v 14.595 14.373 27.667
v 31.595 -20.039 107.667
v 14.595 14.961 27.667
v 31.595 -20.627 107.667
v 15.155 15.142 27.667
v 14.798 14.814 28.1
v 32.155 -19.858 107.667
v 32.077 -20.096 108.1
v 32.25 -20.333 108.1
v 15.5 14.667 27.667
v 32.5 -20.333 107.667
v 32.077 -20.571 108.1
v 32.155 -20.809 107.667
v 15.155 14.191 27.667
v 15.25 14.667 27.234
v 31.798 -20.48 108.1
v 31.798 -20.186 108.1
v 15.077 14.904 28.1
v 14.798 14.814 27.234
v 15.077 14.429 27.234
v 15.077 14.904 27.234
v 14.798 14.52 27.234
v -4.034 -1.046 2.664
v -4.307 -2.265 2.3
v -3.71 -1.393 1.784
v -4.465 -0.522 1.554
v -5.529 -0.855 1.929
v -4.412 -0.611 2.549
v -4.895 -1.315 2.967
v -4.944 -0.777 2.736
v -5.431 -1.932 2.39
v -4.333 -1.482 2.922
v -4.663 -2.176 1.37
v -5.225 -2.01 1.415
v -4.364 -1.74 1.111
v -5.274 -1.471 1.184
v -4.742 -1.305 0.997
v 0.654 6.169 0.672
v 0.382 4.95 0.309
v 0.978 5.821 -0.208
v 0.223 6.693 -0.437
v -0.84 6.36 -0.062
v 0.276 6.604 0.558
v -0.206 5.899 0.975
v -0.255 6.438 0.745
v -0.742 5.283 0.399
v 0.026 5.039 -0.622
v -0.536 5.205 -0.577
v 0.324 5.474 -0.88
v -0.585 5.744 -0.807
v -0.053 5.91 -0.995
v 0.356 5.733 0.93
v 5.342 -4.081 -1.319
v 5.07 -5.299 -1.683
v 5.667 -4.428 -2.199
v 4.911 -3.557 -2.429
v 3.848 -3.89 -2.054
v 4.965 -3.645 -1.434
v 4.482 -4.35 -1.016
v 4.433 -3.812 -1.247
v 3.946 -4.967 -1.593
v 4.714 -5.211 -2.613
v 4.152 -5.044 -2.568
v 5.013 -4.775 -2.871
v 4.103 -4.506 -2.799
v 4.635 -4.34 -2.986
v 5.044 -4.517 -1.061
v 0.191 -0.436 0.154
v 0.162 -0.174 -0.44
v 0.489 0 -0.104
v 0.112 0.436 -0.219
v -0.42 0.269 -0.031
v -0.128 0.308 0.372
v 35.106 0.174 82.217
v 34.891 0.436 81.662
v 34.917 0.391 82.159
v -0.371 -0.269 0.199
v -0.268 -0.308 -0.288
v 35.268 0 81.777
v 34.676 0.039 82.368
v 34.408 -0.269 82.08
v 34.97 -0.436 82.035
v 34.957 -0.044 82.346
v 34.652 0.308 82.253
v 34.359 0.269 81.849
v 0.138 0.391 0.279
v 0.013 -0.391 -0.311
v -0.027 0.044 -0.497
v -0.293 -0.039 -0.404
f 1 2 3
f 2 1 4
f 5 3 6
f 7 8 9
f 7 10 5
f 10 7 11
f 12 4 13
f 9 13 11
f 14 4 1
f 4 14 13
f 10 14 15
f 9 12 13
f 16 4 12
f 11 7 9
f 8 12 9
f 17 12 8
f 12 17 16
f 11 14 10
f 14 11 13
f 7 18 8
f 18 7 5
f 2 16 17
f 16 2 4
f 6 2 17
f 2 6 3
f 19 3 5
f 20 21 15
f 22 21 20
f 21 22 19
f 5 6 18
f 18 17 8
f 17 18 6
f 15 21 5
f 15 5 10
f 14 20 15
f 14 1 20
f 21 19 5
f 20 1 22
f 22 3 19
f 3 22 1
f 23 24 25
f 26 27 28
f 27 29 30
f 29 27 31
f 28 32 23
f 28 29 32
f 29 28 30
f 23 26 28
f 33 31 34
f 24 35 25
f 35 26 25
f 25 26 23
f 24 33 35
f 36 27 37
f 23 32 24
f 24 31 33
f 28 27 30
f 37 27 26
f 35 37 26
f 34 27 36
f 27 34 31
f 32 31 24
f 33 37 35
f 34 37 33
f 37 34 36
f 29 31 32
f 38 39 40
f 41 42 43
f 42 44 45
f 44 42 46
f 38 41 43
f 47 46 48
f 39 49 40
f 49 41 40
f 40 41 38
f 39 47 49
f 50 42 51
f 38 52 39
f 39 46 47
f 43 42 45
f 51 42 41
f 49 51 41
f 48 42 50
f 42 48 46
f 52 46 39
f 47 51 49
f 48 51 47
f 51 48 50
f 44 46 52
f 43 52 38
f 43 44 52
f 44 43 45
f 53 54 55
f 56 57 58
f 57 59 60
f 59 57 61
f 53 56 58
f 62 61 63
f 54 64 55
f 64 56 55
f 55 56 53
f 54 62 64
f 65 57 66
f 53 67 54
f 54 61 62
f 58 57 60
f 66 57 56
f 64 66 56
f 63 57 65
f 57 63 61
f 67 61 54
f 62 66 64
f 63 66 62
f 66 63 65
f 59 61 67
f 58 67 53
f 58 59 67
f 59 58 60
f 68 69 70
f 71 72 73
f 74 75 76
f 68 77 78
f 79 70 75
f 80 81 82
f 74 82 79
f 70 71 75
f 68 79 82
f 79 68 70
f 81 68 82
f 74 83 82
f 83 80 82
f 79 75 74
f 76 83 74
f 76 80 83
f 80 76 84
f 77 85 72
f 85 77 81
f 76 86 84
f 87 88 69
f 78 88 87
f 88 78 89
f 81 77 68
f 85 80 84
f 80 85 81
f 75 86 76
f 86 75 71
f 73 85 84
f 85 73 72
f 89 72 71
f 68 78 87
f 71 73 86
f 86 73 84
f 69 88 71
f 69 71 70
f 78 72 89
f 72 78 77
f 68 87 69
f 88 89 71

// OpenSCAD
/*[show]*/
showOrig=true;
showModified=true;


//translate a random polygon to origin and lay flat

verts= [[10,13,28],[15,20,30],[20,11,25]];

//calculate normal
v= cross(verts[2]-verts[0],verts[1]-verts[0]);

//calculate centroid
centroid=verts[0]/3+verts[1]/3+verts[2]/3;

//calculate rotation from normal
rotX=atan2(v.y,v.z);
rotY=atan2(v.x,v.z);
rotZ=atan2(v.y,v.x); //(not needed)

rot=[rotX,rotY,0];

if (showOrig){
  //normal vector
  color("green") translate(centroid) hull(){
      sphere(0.5);
      translate(v) sphere(0.5);
    }
  polyhedron(verts,[[0,1,2]]);
  } 

if (showModified)
  //rotate
  rotate(rot){
    //translate to origin
    translate(-centroid){
      polyhedron(verts,[[0,1,2]]);
      color("green") for (vert=verts)
        translate(vert) sphere(1);
    }
    //normal vector
    color("green") hull(){
      sphere(0.5);
      translate(v) sphere(0.5);
    }
  }
